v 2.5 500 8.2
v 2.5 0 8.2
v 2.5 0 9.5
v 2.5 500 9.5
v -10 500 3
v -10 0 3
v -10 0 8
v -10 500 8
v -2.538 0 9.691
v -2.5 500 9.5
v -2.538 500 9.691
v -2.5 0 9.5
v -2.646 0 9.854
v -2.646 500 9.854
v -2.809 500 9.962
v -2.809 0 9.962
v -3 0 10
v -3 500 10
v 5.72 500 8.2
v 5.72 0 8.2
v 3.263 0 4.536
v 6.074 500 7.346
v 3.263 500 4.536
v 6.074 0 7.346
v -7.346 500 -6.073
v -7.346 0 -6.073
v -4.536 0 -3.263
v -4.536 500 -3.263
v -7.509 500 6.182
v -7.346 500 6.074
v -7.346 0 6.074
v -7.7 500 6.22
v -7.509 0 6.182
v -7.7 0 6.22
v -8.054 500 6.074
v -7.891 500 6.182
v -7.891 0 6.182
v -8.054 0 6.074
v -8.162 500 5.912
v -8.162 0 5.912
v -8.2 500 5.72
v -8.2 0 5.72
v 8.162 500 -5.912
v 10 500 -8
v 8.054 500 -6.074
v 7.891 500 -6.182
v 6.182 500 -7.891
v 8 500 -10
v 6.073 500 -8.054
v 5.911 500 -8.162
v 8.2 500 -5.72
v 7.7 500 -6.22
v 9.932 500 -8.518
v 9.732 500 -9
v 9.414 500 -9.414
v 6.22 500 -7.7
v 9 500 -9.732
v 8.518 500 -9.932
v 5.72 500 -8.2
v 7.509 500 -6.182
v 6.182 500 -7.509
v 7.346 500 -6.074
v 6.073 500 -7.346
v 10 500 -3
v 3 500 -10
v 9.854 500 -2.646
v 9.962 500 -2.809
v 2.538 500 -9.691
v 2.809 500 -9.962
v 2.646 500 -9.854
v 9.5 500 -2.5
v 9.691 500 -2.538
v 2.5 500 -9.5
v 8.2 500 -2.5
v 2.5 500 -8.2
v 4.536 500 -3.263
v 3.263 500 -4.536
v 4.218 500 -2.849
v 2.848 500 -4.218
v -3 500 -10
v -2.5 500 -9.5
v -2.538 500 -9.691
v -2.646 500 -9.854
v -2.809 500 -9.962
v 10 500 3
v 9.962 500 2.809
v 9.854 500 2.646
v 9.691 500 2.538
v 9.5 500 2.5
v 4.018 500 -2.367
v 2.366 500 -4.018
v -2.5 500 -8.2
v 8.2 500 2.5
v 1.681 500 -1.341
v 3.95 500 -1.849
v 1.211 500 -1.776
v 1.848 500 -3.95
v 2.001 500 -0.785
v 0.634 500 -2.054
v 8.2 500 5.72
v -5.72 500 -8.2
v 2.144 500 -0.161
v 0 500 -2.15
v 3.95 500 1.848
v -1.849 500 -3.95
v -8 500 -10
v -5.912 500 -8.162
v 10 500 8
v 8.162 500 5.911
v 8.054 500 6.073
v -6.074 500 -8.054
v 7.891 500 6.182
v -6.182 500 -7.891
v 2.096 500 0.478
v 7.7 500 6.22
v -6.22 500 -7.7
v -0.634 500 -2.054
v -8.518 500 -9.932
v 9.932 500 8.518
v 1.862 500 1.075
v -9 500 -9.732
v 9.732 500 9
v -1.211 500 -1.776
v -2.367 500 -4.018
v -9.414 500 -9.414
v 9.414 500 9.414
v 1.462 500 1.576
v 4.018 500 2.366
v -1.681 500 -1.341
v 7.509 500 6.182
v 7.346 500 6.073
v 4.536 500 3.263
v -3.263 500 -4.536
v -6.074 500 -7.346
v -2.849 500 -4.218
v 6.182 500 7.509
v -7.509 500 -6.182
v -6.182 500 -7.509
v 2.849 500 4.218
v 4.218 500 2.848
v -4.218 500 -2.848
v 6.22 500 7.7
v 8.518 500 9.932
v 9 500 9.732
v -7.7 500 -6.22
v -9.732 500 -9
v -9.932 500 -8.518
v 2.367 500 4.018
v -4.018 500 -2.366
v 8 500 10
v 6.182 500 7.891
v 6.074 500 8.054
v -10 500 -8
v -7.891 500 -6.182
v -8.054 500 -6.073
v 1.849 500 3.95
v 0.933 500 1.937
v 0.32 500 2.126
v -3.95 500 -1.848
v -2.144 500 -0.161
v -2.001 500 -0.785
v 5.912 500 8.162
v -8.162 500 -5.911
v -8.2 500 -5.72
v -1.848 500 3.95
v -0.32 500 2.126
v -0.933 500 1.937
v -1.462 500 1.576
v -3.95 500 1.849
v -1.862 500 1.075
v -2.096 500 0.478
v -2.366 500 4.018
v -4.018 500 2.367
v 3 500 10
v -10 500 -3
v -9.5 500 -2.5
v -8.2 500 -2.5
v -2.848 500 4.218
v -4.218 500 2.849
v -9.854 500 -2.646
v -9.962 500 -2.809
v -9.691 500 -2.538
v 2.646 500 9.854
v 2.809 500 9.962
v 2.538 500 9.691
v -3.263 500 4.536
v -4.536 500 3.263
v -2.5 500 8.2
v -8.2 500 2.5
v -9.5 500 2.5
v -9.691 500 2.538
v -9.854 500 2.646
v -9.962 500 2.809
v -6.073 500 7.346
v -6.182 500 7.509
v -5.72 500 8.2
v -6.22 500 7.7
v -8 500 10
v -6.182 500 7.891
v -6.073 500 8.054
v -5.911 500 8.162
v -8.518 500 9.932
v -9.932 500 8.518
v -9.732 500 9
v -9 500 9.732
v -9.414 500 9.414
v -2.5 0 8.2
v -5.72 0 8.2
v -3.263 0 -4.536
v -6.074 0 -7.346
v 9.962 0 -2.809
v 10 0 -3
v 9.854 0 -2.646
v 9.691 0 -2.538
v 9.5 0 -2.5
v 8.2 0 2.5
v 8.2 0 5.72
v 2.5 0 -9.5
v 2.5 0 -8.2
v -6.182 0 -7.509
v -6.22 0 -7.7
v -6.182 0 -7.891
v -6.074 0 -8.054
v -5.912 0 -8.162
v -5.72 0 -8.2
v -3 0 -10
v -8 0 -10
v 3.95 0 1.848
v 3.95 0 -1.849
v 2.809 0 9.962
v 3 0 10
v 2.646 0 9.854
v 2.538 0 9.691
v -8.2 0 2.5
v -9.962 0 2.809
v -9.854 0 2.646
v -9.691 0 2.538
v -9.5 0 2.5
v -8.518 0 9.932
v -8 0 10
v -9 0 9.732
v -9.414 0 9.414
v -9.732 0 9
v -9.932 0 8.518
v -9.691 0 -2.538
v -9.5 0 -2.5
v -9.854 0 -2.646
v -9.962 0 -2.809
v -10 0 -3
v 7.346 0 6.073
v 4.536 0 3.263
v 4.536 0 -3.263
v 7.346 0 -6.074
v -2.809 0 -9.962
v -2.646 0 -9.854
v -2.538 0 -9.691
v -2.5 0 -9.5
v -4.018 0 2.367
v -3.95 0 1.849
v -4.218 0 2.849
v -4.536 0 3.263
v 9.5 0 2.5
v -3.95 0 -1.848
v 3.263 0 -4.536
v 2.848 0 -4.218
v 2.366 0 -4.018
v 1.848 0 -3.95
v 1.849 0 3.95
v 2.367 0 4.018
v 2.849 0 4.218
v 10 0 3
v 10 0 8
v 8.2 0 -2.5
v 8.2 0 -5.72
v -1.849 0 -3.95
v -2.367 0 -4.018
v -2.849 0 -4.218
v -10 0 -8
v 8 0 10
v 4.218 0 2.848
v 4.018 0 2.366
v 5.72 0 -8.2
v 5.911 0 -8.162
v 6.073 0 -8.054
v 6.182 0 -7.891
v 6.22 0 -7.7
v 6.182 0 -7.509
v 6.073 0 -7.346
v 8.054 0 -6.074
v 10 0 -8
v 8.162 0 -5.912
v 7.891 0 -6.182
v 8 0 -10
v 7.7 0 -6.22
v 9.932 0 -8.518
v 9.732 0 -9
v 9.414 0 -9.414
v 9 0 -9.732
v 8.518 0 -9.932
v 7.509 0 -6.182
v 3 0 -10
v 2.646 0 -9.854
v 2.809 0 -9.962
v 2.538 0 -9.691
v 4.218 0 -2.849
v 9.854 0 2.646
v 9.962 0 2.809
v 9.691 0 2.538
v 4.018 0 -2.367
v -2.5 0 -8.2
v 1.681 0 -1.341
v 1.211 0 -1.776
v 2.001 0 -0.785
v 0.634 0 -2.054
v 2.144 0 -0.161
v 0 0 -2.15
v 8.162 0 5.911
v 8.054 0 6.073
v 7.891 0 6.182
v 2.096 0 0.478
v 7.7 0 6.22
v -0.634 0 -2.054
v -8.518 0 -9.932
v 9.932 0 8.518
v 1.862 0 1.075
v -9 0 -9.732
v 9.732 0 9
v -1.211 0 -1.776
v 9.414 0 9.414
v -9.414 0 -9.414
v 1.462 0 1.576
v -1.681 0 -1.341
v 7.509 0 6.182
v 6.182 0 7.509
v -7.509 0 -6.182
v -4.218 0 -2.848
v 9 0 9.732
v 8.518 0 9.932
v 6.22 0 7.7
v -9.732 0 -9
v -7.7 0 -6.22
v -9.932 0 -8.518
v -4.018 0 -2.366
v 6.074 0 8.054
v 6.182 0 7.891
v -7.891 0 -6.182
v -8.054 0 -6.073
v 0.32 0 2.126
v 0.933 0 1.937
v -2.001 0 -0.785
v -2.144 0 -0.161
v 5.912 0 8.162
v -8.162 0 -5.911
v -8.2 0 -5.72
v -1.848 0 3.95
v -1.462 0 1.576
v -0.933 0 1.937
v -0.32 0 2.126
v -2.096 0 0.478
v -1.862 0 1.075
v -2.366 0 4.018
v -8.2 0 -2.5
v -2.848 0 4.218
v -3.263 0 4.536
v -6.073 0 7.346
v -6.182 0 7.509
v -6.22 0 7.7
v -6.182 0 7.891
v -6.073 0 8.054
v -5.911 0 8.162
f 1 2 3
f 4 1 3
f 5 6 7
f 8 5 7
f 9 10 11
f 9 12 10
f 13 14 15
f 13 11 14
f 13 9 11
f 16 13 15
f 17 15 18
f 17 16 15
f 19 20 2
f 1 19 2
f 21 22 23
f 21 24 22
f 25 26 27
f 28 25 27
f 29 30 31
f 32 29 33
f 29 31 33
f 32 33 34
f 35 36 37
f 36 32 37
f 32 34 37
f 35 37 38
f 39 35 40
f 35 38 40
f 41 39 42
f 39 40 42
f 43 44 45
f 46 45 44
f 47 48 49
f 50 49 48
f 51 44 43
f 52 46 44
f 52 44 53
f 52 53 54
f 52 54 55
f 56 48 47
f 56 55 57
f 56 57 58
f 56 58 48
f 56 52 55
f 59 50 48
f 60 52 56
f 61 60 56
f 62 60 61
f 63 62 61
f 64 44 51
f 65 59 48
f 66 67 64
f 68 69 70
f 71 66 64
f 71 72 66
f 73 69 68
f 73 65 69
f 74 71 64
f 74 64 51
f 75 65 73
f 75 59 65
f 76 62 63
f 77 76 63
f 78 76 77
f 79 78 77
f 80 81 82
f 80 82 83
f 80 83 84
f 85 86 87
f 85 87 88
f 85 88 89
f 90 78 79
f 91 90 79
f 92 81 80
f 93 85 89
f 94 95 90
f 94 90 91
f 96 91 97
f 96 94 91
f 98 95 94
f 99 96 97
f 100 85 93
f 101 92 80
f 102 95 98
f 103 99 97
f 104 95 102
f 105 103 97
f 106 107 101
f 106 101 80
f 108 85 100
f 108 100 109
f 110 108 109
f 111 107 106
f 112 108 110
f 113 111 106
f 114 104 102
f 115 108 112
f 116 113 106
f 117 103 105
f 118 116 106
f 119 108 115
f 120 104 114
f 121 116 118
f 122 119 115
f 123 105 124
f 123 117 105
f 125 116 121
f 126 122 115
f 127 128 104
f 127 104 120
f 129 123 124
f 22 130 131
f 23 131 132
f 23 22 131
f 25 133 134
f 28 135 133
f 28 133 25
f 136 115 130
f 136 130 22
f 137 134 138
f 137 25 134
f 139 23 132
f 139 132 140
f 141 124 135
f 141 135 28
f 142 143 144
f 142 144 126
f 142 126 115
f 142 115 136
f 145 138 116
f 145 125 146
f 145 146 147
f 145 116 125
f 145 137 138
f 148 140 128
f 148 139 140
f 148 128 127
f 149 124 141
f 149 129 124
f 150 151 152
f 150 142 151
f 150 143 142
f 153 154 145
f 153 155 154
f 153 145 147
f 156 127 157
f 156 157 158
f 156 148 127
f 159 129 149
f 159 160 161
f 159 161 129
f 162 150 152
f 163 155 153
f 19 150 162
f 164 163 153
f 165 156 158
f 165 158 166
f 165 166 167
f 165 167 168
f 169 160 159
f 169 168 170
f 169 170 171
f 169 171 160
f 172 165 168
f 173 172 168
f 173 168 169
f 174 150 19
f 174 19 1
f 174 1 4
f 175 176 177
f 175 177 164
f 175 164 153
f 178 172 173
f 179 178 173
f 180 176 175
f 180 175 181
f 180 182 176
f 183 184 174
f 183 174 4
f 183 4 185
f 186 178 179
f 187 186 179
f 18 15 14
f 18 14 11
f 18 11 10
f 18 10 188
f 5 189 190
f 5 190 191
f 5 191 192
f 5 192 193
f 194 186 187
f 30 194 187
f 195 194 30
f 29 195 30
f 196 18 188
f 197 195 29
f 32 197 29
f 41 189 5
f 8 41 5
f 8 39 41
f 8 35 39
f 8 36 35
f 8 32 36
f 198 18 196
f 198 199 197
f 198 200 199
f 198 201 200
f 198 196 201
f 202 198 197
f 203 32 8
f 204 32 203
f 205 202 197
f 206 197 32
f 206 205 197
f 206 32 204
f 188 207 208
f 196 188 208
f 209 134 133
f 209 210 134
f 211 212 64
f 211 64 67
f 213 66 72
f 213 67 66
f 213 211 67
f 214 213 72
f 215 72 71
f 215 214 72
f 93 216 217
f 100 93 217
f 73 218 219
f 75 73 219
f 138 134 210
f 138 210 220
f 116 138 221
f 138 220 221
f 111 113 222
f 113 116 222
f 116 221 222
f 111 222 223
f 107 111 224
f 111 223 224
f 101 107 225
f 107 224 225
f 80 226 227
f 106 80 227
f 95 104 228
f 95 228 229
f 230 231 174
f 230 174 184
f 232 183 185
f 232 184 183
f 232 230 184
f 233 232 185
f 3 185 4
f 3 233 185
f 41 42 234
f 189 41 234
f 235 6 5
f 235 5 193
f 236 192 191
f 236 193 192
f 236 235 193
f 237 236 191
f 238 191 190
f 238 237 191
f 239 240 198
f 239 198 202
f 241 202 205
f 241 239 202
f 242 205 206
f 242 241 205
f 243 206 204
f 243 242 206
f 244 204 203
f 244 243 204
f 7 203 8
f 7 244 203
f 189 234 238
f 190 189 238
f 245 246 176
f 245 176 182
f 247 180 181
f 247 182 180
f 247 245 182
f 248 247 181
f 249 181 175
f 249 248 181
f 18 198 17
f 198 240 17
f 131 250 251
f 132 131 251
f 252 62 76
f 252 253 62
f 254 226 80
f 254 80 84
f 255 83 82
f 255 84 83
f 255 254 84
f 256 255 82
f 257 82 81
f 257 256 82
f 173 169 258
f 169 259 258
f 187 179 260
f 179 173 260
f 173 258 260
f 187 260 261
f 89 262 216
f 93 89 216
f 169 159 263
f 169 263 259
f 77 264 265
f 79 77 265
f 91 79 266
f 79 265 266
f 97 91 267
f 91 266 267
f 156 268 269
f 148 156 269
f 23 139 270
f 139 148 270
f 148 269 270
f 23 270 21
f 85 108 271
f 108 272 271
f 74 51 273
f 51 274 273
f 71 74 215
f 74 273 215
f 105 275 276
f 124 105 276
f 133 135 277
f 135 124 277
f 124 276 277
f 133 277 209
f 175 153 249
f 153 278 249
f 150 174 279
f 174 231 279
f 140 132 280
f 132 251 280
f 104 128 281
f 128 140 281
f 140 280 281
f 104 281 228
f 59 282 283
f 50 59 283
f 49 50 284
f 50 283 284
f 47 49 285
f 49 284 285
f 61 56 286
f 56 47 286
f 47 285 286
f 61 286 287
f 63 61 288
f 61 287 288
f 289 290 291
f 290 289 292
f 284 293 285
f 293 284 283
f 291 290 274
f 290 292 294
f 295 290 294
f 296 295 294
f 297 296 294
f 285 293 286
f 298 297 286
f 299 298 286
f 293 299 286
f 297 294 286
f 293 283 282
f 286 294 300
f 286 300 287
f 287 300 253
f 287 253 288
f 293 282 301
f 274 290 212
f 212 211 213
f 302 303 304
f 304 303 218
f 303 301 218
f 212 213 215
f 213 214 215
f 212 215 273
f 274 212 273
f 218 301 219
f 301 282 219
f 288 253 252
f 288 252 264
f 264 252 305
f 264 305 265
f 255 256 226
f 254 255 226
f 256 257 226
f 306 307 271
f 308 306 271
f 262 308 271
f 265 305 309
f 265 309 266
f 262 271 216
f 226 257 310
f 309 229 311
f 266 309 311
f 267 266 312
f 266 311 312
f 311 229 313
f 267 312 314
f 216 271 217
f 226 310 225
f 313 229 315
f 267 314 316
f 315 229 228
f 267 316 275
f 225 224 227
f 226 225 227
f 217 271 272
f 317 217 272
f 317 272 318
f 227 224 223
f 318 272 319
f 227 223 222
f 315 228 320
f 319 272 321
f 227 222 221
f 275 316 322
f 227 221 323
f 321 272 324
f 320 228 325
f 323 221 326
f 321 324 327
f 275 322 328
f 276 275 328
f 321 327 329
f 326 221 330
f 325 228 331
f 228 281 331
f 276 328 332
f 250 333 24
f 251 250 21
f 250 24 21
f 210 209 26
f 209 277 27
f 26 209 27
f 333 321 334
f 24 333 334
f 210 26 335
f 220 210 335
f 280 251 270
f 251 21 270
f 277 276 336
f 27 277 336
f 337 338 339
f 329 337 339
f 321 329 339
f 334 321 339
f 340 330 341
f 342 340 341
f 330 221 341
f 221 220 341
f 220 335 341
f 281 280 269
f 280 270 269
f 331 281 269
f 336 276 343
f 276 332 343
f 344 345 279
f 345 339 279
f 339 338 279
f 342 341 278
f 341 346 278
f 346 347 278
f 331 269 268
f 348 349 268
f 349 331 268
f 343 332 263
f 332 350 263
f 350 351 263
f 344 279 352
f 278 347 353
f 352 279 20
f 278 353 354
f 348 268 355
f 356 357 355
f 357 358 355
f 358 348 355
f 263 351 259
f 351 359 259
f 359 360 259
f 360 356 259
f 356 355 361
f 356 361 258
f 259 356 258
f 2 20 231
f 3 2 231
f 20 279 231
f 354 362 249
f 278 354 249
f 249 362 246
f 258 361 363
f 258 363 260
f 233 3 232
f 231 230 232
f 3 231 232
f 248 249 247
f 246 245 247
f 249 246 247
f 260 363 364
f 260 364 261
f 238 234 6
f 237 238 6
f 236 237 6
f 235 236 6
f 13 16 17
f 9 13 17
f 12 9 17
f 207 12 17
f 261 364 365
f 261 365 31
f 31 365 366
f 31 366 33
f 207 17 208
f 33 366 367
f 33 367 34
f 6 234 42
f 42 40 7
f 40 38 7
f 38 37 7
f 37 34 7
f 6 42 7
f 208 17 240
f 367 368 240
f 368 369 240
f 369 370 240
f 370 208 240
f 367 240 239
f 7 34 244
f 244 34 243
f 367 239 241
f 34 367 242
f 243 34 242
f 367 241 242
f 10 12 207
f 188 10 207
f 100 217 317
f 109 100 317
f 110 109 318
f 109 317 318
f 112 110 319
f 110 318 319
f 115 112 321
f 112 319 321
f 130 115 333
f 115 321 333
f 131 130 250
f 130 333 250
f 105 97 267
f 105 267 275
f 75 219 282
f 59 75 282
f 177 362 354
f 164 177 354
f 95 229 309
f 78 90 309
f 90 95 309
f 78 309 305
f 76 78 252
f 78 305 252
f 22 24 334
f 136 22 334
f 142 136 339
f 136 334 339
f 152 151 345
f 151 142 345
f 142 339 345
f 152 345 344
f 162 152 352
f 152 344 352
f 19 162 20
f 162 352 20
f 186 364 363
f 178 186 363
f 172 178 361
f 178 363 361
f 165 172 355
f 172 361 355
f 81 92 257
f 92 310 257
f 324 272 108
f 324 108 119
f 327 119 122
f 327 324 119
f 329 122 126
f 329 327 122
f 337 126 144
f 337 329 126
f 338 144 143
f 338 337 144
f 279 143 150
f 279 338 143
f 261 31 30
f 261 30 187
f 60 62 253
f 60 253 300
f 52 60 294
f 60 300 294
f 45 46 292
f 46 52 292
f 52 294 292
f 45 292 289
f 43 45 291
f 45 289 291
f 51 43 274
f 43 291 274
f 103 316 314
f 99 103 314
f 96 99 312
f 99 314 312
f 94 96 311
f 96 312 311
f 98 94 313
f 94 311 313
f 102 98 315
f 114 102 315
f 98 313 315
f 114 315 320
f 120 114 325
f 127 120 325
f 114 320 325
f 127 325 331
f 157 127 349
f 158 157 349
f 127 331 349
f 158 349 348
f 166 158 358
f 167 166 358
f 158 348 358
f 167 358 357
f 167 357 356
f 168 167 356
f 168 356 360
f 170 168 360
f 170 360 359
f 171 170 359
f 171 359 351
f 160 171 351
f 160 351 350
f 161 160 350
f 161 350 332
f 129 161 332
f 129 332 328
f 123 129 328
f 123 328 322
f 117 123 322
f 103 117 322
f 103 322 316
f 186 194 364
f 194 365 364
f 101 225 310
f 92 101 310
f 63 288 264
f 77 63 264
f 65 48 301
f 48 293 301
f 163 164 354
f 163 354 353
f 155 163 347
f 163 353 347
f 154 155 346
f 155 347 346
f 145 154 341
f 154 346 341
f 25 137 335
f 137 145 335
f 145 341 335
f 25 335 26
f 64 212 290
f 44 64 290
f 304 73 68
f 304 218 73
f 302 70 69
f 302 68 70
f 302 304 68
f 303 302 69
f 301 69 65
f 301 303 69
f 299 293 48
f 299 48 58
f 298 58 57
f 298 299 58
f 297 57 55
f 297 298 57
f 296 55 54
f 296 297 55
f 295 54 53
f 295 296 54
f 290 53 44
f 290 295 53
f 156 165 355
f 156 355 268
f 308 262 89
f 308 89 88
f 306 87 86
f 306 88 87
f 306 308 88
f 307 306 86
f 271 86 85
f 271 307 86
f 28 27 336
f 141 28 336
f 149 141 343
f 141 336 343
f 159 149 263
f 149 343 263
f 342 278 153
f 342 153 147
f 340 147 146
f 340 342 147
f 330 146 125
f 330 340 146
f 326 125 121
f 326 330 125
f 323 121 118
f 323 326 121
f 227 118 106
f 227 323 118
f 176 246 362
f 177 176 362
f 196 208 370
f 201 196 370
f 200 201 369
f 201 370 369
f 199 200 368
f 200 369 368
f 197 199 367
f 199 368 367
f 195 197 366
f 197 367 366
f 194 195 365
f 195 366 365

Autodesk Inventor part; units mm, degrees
ref_plane "YZ Plane" through (0, 0, 0) normal (1, 0, 0) x (0, 1, 0)
ref_plane "XZ Plane" through (0, 0, 0) normal (0, 1, 0) x (-1, 0, 0)
ref_plane "XY Plane" through (0, 0, 0) normal (0, 0, 1) x (1, 0, 0)
sketch "Sketch1" plane through (0, 0, 0) normal (0, 1, 0) x (-1, 0, 0)
  line L0 (8, 10) -> (3, 10)
  line L1 (10, 3) -> (10, 8)
  line L2 (2.5, 9.5) -> (2.5, 8.2)
  line L3 (2.5, 8.2) -> (5.7198, 8.2)
  line L4 (6.0734, 7.3464) -> (3.2627, 4.5358)
  line L5 (1.8485, 3.95) -> (0, 3.95)
  line L6 (0, 3.95) -> (0, 2.15)
  line L7 (0, 2.15) -> (0, 2.15)
  line L8 (2.15, 0) -> (2.15, 0)
  line L9 (2.15, 0) -> (3.95, 0)
  line L10 (8.2, 5.7204) -> (8.2, 2.5)
  line L11 (8.2, 2.5) -> (9.5, 2.5)
  line L12 (0, 29.0836) -> (0, -4.1523) construction
  line L13 (3.95, 0) -> (3.95, 1.8491)
  line L14 (7.3464, 6.0739) -> (4.5358, 3.2633)
  arc A0 (10, 8) -> (8, 10) centre (8, 8) ccw
  arc A1 (8.2, 5.7204) -> (7.3464, 6.0739) centre (7.7, 5.7204) ccw
  arc A2 (6.0734, 7.3464) -> (5.7198, 8.2) centre (5.7198, 7.7) ccw
  arc A3 (4.5358, 3.2633) -> (3.95, 1.8491) centre (5.95, 1.8491) ccw
  arc A4 (1.8485, 3.95) -> (3.2627, 4.5358) centre (1.8485, 5.95) ccw
  arc A5 (2.15, 0) -> (0, 2.15) centre (0, 0) ccw
  arc A6 (3, 10) -> (2.5, 9.5) centre (3, 9.5) ccw
  arc A7 (9.5, 2.5) -> (10, 3) centre (9.5, 3) ccw
  line L15 (18.5462, 0) -> (-9.9601, 0) construction
  line L16 (-3, 10) -> (-8, 10)
  arc A8 (-2.5, 9.5) -> (-3, 10) centre (-3, 9.5) ccw
  line L17 (-2.5, 8.2) -> (-2.5, 9.5)
  line L18 (-5.7204, 8.2) -> (-2.5, 8.2)
  arc A9 (-5.7204, 8.2) -> (-6.0739, 7.3464) centre (-5.7204, 7.7) ccw
  line L19 (-6.0739, 7.3464) -> (-3.2633, 4.5358)
  arc A10 (-3.2633, 4.5358) -> (-1.8491, 3.95) centre (-1.8491, 5.95) ccw
  line L20 (0, 3.95) -> (-1.8491, 3.95)
  line L21 (0, 2.15) -> (0, 3.95)
  arc A11 (0, 2.15) -> (-2.15, 0) centre (0, 0) ccw
  line L22 (-3.95, 0) -> (-2.15, 0)
  line L23 (-3.95, 1.8485) -> (-3.95, 0)
  arc A12 (-3.95, 1.8485) -> (-4.5358, 3.2627) centre (-5.95, 1.8485) ccw
  line L24 (-7.3464, 6.0734) -> (-4.5358, 3.2627)
  arc A13 (-7.3464, 6.0734) -> (-8.2, 5.7198) centre (-7.7, 5.7198) ccw
  line L25 (-8.2, 2.5) -> (-8.2, 5.7198)
  line L26 (-9.5, 2.5) -> (-8.2, 2.5)
  arc A14 (-10, 3) -> (-9.5, 2.5) centre (-9.5, 3) ccw
  line L27 (-10, 8) -> (-10, 3)
  arc A15 (-8, 10) -> (-10, 8) centre (-8, 8) ccw
  line L28 (-10, -3) -> (-10, -8)
  arc A16 (-9.5, -2.5) -> (-10, -3) centre (-9.5, -3) ccw
  line L29 (-8.2, -2.5) -> (-9.5, -2.5)
  line L30 (-8.2, -5.7204) -> (-8.2, -2.5)
  arc A17 (-8.2, -5.7204) -> (-7.3464, -6.0739) centre (-7.7, -5.7204) ccw
  line L31 (-7.3464, -6.0739) -> (-4.5358, -3.2633)
  arc A18 (-4.5358, -3.2633) -> (-3.95, -1.8491) centre (-5.95, -1.8491) ccw
  line L32 (-3.95, 0) -> (-3.95, -1.8491)
  line L33 (-2.15, 0) -> (-3.95, 0)
  arc A19 (-2.15, 0) -> (0, -2.15) centre (0, 0) ccw
  line L34 (0, -3.95) -> (0, -2.15)
  line L35 (-1.8485, -3.95) -> (0, -3.95)
  arc A20 (-1.8485, -3.95) -> (-3.2627, -4.5358) centre (-1.8485, -5.95) ccw
  line L36 (-6.0734, -7.3464) -> (-3.2627, -4.5358)
  arc A21 (-6.0734, -7.3464) -> (-5.7198, -8.2) centre (-5.7198, -7.7) ccw
  line L37 (-2.5, -8.2) -> (-5.7198, -8.2)
  line L38 (-2.5, -9.5) -> (-2.5, -8.2)
  arc A22 (-3, -10) -> (-2.5, -9.5) centre (-3, -9.5) ccw
  line L39 (-8, -10) -> (-3, -10)
  arc A23 (-10, -8) -> (-8, -10) centre (-8, -8) ccw
  line L40 (3, -10) -> (8, -10)
  arc A24 (2.5, -9.5) -> (3, -10) centre (3, -9.5) ccw
  line L41 (2.5, -8.2) -> (2.5, -9.5)
  line L42 (5.7204, -8.2) -> (2.5, -8.2)
  arc A25 (5.7204, -8.2) -> (6.0739, -7.3464) centre (5.7204, -7.7) ccw
  line L43 (6.0739, -7.3464) -> (3.2633, -4.5358)
  arc A26 (3.2633, -4.5358) -> (1.8491, -3.95) centre (1.8491, -5.95) ccw
  line L44 (0, -3.95) -> (1.8491, -3.95)
  line L45 (0, -2.15) -> (0, -3.95)
  arc A27 (0, -2.15) -> (2.15, 0) centre (0, 0) ccw
  line L46 (3.95, 0) -> (2.15, 0)
  line L47 (3.95, -1.8485) -> (3.95, 0)
  arc A28 (3.95, -1.8485) -> (4.5358, -3.2627) centre (5.95, -1.8485) ccw
  line L48 (7.3464, -6.0734) -> (4.5358, -3.2627)
  arc A29 (7.3464, -6.0734) -> (8.2, -5.7198) centre (7.7, -5.7198) ccw
  line L49 (8.2, -2.5) -> (8.2, -5.7198)
  line L50 (9.5, -2.5) -> (8.2, -2.5)
  arc A30 (10, -3) -> (9.5, -2.5) centre (9.5, -3) ccw
  line L51 (10, -8) -> (10, -3)
  arc A31 (8, -10) -> (10, -8) centre (8, -8) ccw
  line L52 (8.2, 3.6987) -> (10, 3.6987)
  line L53 (10, 3.6987) -> (10, -4.1099)
  line L54 (10, -4.1099) -> (8.2, -4.1099)
  line L55 (8.2, -4.1099) -> (8.2, 3.6987)
  point P0 (0, 0)
  point P1 (3.95, 2.6775)
  point P2 (-2.6775, 3.95)
  point P3 (0, 0)
  point P4 (-3.95, -2.6775)
  point P5 (0, 0)
  point P6 (2.6775, -3.95)
  point P7 (0, 0)
  dimension "d1" = 2.5
  dimension "d2" = 2.5
  dimension "d3" = 1.8
  dimension "d4" = 1.8
  dimension "d5" = 45
  dimension "d6" = 2.15
  dimension "d7" = 2.15
  dimension "d8" = 1.8
  dimension "d11" = 10
  dimension "d12" = 10
  dimension "d14" = 1.8
  dimension "d15" = 1.8
  dimension "d16" = 2.6775
  dimension "d18" = 2
  dimension "d19" = 0.5
  dimension "d20" = 2
  dimension "d21" = 2.15
  dimension "d22" = 0.5
  dimension "d25" = 360
extrude "Profil_20x20" add sketch "Sketch1" along normal blind 500 contours A0 L1 L52 L10 A1 L14 A3 L13 L9 A5 L6 L5 A4 L4 A2 L3 L2 A6 L0 | L1 A7 L11 L10 L52 | L51 L54 L49 L50 A30 | L51 A31 L40 A24 L41 L42 A25 L43 A26 L44 L34 A27 L9 L47 A28 L48 A29 L49 L54 | L6 A11 L22 L23 A12 L24 A13 L25 L26 A14 L27 A15 L16 A8 L17 L18 A9 L19 A10 L20 | A19 L34 L35 A20 L36 A21 L37 L38 A22 L39 A23 L28 A16 L29 L30 A17 L31 A18 L32 L22
properties part number "Profil_20x20_500"
